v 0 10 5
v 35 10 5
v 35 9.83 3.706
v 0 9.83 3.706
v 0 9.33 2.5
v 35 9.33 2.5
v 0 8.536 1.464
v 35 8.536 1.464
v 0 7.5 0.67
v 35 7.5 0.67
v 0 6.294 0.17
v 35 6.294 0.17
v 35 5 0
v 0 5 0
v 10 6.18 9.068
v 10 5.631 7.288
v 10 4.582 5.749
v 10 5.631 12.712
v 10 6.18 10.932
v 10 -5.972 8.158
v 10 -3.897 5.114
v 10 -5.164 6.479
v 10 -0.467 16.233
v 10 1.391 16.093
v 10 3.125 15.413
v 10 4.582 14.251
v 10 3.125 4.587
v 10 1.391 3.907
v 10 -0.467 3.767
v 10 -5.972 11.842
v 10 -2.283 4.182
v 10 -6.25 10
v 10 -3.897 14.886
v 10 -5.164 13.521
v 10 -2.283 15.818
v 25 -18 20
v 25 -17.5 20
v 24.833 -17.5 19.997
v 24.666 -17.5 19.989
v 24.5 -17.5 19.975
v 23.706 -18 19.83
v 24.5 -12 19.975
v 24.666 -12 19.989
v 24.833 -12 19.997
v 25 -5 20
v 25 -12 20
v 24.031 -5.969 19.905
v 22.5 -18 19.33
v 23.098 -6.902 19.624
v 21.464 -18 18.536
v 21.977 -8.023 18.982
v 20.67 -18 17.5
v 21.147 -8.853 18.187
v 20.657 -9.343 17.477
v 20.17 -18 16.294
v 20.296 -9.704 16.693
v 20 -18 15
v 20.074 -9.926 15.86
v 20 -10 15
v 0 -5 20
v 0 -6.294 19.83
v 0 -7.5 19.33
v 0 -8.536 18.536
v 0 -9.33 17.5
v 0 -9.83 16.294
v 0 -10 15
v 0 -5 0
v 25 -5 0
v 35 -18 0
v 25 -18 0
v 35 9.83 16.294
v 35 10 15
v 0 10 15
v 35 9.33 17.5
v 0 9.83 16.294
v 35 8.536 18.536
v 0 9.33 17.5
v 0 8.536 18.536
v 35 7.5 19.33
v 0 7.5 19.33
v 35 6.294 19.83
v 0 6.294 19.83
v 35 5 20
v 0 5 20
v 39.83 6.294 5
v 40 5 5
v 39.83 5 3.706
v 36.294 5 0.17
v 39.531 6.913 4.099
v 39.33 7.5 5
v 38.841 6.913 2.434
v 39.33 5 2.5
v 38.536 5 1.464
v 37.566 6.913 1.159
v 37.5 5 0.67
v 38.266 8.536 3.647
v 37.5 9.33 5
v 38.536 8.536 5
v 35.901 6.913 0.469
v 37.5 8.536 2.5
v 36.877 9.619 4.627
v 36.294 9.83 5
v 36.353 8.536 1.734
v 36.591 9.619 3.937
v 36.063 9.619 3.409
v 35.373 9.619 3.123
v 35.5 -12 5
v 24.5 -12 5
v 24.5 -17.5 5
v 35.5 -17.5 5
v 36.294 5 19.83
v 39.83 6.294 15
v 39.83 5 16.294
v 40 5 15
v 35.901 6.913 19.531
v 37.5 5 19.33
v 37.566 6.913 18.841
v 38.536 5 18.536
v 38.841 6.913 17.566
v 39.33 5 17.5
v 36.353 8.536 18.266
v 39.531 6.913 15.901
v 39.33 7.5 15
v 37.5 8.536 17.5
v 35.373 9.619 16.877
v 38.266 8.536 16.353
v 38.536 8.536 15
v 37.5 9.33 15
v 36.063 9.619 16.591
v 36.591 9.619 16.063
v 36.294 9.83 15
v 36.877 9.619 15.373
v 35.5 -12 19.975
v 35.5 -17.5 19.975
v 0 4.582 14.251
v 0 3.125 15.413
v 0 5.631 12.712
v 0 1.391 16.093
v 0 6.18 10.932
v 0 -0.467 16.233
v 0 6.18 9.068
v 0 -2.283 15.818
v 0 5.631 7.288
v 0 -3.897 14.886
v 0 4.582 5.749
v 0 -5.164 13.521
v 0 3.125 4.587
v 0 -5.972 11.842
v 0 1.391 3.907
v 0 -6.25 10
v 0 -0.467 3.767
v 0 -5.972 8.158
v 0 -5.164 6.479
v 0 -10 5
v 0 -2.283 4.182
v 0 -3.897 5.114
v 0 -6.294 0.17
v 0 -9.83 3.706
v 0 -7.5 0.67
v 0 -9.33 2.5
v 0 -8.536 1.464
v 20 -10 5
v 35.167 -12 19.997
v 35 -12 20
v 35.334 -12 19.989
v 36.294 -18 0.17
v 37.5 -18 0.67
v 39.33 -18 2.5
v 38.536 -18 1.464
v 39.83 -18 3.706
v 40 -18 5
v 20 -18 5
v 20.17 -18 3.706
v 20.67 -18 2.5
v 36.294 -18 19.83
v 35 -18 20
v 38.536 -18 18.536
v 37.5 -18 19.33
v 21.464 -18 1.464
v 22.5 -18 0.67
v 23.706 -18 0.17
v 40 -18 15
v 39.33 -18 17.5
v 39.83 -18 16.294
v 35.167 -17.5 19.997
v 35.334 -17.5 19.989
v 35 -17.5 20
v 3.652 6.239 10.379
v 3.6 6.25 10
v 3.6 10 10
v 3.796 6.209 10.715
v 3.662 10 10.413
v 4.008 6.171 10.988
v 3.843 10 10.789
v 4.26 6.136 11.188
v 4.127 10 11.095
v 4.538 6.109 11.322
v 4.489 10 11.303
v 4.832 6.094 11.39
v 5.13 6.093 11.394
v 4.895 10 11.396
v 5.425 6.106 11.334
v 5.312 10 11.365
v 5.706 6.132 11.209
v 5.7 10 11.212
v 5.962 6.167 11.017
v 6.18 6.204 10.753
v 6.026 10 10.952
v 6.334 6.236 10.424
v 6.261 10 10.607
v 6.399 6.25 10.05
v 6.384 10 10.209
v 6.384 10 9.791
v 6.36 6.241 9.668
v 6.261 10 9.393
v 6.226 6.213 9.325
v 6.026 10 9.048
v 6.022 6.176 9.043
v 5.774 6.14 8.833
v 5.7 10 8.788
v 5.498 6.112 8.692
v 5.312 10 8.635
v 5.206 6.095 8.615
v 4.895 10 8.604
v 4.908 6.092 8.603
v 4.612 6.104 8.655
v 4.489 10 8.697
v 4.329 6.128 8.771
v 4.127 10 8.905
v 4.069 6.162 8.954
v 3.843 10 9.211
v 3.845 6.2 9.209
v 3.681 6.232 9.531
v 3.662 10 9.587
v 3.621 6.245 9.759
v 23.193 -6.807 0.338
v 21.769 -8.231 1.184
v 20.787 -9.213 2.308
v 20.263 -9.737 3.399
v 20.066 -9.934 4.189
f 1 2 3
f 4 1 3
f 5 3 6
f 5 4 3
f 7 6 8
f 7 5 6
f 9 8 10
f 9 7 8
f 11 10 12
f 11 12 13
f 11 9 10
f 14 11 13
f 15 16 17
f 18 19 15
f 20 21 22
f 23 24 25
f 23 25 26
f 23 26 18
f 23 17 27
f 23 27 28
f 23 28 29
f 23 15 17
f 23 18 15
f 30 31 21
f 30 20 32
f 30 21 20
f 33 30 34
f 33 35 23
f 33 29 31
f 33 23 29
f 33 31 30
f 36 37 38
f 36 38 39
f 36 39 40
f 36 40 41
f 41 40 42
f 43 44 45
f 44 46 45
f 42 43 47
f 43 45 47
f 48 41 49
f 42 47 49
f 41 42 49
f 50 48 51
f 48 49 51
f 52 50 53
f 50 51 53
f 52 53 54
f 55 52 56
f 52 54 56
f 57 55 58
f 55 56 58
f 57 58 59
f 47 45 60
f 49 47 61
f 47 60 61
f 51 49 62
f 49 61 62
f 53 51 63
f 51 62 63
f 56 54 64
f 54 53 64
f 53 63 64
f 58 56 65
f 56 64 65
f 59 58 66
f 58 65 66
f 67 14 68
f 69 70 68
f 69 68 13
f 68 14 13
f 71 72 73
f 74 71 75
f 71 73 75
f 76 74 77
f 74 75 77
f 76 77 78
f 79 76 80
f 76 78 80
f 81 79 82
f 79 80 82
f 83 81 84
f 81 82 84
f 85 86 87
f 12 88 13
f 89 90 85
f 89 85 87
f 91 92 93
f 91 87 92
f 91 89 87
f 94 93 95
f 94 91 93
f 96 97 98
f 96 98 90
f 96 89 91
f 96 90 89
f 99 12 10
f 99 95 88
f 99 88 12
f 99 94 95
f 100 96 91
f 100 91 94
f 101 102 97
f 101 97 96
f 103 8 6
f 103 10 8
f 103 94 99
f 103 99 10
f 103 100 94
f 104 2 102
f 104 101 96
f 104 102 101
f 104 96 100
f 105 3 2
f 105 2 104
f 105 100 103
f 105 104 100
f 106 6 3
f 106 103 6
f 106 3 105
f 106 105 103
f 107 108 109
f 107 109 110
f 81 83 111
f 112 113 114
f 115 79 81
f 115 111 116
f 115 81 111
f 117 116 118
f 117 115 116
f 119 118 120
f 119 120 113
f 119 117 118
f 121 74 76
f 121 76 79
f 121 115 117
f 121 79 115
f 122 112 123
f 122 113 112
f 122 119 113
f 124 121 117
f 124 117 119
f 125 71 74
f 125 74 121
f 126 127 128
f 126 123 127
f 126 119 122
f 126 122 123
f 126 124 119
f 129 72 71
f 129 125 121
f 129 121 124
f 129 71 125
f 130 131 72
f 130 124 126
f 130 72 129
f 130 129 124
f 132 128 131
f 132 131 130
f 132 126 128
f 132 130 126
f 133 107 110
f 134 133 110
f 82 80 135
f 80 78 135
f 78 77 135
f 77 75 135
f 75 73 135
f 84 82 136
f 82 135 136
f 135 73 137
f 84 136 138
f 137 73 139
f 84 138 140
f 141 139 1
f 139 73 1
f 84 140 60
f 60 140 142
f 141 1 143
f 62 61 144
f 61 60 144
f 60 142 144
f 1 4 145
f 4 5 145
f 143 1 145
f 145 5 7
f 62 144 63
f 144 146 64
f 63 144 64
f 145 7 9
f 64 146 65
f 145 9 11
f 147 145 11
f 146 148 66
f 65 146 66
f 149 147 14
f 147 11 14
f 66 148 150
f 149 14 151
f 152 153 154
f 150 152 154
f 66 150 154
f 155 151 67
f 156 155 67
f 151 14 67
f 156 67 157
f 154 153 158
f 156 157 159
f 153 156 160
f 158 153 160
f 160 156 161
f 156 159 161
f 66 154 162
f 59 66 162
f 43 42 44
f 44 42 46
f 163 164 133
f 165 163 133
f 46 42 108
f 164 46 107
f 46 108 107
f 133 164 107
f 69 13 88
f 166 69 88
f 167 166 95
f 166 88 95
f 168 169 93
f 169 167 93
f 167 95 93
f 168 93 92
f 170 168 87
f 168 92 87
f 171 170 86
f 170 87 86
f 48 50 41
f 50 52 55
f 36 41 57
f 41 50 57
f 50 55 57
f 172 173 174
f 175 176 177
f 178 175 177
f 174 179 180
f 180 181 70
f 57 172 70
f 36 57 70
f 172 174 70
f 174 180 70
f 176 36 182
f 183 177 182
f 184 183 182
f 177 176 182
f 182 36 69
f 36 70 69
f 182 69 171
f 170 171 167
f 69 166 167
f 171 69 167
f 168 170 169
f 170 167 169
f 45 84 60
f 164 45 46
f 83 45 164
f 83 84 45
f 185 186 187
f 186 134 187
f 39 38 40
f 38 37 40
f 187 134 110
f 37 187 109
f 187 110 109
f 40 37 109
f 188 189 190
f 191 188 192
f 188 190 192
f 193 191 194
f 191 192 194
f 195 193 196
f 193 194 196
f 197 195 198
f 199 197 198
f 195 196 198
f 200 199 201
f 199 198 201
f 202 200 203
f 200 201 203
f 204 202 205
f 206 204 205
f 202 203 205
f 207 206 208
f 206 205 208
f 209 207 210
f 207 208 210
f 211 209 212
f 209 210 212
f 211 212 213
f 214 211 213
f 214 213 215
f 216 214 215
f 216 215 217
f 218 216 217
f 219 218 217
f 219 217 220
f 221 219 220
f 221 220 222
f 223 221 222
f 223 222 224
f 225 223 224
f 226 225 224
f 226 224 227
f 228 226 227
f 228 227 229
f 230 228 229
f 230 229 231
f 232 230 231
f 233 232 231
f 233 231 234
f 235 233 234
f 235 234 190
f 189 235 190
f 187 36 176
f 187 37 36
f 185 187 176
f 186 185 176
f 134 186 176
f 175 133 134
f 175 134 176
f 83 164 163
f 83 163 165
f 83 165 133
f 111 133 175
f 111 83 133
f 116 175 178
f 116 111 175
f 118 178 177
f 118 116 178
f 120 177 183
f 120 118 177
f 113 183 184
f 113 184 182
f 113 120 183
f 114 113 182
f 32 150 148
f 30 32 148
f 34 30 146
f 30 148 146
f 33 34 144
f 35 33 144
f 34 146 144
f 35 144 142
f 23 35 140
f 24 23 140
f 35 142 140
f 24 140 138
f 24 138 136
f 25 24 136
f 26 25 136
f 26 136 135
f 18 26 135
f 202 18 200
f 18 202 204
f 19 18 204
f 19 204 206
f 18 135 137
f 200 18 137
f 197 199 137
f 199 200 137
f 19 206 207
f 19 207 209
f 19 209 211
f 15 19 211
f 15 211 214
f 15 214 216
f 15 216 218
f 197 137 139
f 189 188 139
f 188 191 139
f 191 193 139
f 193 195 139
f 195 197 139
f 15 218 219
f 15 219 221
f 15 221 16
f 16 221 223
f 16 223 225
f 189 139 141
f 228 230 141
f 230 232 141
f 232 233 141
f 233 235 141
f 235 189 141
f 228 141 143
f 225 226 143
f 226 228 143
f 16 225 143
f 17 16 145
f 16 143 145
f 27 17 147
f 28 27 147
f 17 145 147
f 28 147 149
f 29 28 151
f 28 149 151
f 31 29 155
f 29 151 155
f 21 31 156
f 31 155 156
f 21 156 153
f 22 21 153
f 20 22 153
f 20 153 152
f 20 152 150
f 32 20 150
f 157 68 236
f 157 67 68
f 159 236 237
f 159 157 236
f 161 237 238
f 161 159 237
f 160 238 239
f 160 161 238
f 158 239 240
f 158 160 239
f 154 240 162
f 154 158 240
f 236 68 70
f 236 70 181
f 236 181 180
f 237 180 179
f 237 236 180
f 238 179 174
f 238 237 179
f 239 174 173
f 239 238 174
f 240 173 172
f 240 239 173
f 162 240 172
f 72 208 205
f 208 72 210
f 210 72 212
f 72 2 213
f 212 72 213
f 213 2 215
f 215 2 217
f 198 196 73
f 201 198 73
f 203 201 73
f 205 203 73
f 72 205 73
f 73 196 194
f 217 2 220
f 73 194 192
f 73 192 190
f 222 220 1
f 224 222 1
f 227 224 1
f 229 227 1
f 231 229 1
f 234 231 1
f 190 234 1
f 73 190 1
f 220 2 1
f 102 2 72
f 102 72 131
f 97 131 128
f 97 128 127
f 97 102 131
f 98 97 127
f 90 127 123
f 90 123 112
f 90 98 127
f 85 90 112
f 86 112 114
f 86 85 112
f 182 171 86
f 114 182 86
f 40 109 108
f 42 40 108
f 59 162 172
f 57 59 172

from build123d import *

# Parameters (mm, degrees)
F1_DEPTH     = 20
F2_DEPTH     = 5
F3_R         = 6.25
F4_DEPTH     = 10
F5_R         = 1.4
F6_DEPTH     = 3.9098179487
F7_T1_DEPTH  = 47.5
F7_T3_DEPTH  = 32.5
F7_T5_DEPTH  = 20.5
F7_T7_DEPTH  = 35.5
F7_T9_DEPTH  = 10
F7_S13_W     = 5
F7_S13_H     = 5
F7_T14_DEPTH = 5
F7_S19_W     = 5
F7_S19_H     = 5
F7_T20_DEPTH = 5
F7_T27_DEPTH = 45
F7_T31_DEPTH = 33
F7_T38_DEPTH = 45
F7_T42_DEPTH = 33


# Not quite as in the source:
# - a fillet or chamfer that OpenCascade refuses, or shapes differently, is made with other operations: its cross-section is extruded or revolved along the edge and cut away or added


with BuildPart() as f1:
    # F0 (on Top) → F1 (new body)
    with BuildSketch(Plane.XY):
        Polygon((0, 10), (0, 0), (0, -10), (20, -10), (20, -18), (40, -18), (40, 10), align=None)
        Polygon((35.5, -12), (35.5, -17.5), (30, -17.5), (24.5, -17.5), (24.5, -12), align=None, mode=Mode.SUBTRACT)
    extrude(amount=F1_DEPTH)

    # F0 (on Top) → F2 (join)
    with BuildSketch(Plane.XY):
        Polygon((30, -17.5), (35.5, -17.5), (35.5, -12), (24.5, -12), (24.5, -17.5), align=None)
    extrude(amount=F2_DEPTH)

    # F3 (on face) → F4 (cut)
    with BuildSketch(Plane(origin=(0, 0, 0), x_dir=(0, -1, 0), z_dir=(-1, 0, 0))):
        with Locations((0, 10)):
            Circle(F3_R)
    extrude(amount=-F4_DEPTH, mode=Mode.SUBTRACT)

    # F5 (on face) → F6 (cut, through all)
    with BuildSketch(Plane(origin=(0, 10, 0), x_dir=(-1, 0, 0), z_dir=(0, 1, 0))):
        with Locations((-5, 10)):
            Circle(F5_R)
    extrude(amount=-F6_DEPTH, mode=Mode.SUBTRACT)

    # F7: fillet of radius 5 on 9 edges, made by hand

    # F7_s2 → F7_t1 (cut)
    with BuildSketch(Plane.YZ.offset(-12.5)):
        with BuildLine():
            ThreePointArc((10, 15), (8.5355339059, 18.5355339059), (5, 20))
            Line((5, 20), (10, 20))
            Line((10, 20), (10, 15))
        make_face()
        with BuildLine():
            ThreePointArc((10, 5), (8.5355339059, 1.4644660941), (5, 0))
            Line((5, 0), (10, 0))
            Line((10, 0), (10, 5))
        make_face()
    extrude(amount=F7_T1_DEPTH, mode=Mode.SUBTRACT)

    # F7_s4 → F7_t3 (cut)
    with BuildSketch(Plane.YZ.offset(-12.5)):
        with BuildLine():
            ThreePointArc((-5, 20), (-8.5355339059, 18.5355339059), (-10, 15))
            Line((-10, 15), (-10, 20))
            Line((-10, 20), (-5, 20))
        make_face()
        with BuildLine():
            ThreePointArc((-5, 0), (-8.5355339059, 1.4644660941), (-10, 5))
            Line((-10, 5), (-10, 0))
            Line((-10, 0), (-5, 0))
        make_face()
    extrude(amount=F7_T3_DEPTH, mode=Mode.SUBTRACT)

    # F7_s6 → F7_t5 (cut)
    with BuildSketch(Plane.XZ.offset(10)):
        with BuildLine():
            ThreePointArc((25, 20), (21.4644660941, 18.5355339059), (20, 15))
            Line((20, 15), (20, 20))
            Line((20, 20), (25, 20))
        make_face()
        with BuildLine():
            ThreePointArc((25, 0), (21.4644660941, 1.4644660941), (20, 5))
            Line((20, 5), (20, 0))
            Line((20, 0), (25, 0))
        make_face()
    extrude(amount=F7_T5_DEPTH, mode=Mode.SUBTRACT)

    # F7_s8 → F7_t7 (cut)
    with BuildSketch(Plane.XZ.offset(-5)):
        with BuildLine():
            ThreePointArc((35, 20), (38.5355339059, 18.5355339059), (40, 15))
            Line((40, 15), (40, 20))
            Line((40, 20), (35, 20))
        make_face()
        with BuildLine():
            ThreePointArc((35, 0), (38.5355339059, 1.4644660941), (40, 5))
            Line((40, 5), (40, 0))
            Line((40, 0), (35, 0))
        make_face()
    extrude(amount=F7_T7_DEPTH, mode=Mode.SUBTRACT)

    # F7_s10 → F7_t9 (cut)
    with BuildSketch(Plane.XY.offset(5)):
        with BuildLine():
            ThreePointArc((35, 10), (38.5355339059, 8.5355339059), (40, 5))
            Line((40, 5), (40, 10))
            Line((40, 10), (35, 10))
        make_face()
    extrude(amount=F7_T9_DEPTH, mode=Mode.SUBTRACT)


with BuildPart() as f7_tool12:
    # F7_s13 → F7_t14 (new body)
    with BuildSketch(Plane.XZ.offset(-5)):
        with Locations((37.5, 17.5)):
            Rectangle(F7_S13_W, F7_S13_H)
    extrude(amount=-F7_T14_DEPTH)

    # F7_s15 → F7_t16 (revolve, cut)
    with BuildSketch(Plane(origin=(35, 5, 15), x_dir=(-0.7071067812, 0, -0.7071067812), z_dir=(0.7071067812, 0, -0.7071067812))):
        with BuildLine():
            ThreePointArc((0, -5), (5, 0), (0, 5))
            Line((0, 5), (0, -5))
        make_face()
    revolve(axis=Axis((35, 5, 15), (0, 1, 0)), mode=Mode.SUBTRACT)


with BuildPart() as f1_1:
    add(f1.part)

    # F7_t11: cut F7_tool12
    add(f7_tool12.part, mode=Mode.SUBTRACT)


with BuildPart() as f7_tool18:
    # F7_s19 → F7_t20 (new body)
    with BuildSketch(Plane.XZ.offset(-5)):
        with Locations((37.5, 2.5)):
            Rectangle(F7_S19_W, F7_S19_H)
    extrude(amount=-F7_T20_DEPTH)

    # F7_s21 → F7_t22 (revolve, cut)
    with BuildSketch(Plane(origin=(35, 5, 5), x_dir=(-0.7071067812, 0, 0.7071067812), z_dir=(-0.7071067812, 0, -0.7071067812))):
        with BuildLine():
            ThreePointArc((0, -5), (5, 0), (0, 5))
            Line((0, 5), (0, -5))
        make_face()
    revolve(axis=Axis((35, 5, 5), (0, 1, 0)), mode=Mode.SUBTRACT)


with BuildPart() as f1_2:
    add(f1_1.part)

    # F7_t17: cut F7_tool18
    add(f7_tool18.part, mode=Mode.SUBTRACT)


with BuildPart() as f7_tool25:
    # F7_s26 → F7_t27 (new body)
    with BuildSketch(Plane.YZ.offset(-12.5)):
        with BuildLine():
            ThreePointArc((-5, 20), (-8.5355339059, 18.5355339059), (-10, 15))
            Line((-10, 15), (-10, 20))
            Line((-10, 20), (-5, 20))
        make_face()
    extrude(amount=F7_T27_DEPTH)

    split(bisect_by=Plane.YZ.offset(20), keep=Keep.TOP)


with BuildPart() as f7_tool29:
    # F7_s30 → F7_t31 (new body)
    with BuildSketch(Plane.XZ.offset(-2.5)):
        with BuildLine():
            ThreePointArc((25, 20), (21.4644660941, 18.5355339059), (20, 15))
            Line((20, 15), (20, 20))
            Line((20, 20), (25, 20))
        make_face()
    extrude(amount=F7_T31_DEPTH)

    split(bisect_by=Plane.XZ.offset(10), keep=Keep.BOTTOM)


with BuildPart() as f7_tool25_1:
    add(f7_tool25.part)

    # F7_t33: intersect F7_tool29
    add(f7_tool29.part, mode=Mode.INTERSECT)


with BuildPart() as f1_3:
    add(f1_2.part)

    # F7_t23: cut F7_tool25
    add(f7_tool25_1.part, mode=Mode.SUBTRACT)


with BuildPart() as f7_tool36:
    # F7_s37 → F7_t38 (new body)
    with BuildSketch(Plane.YZ.offset(-12.5)):
        with BuildLine():
            ThreePointArc((-5, 0), (-8.5355339059, 1.4644660941), (-10, 5))
            Line((-10, 5), (-10, 0))
            Line((-10, 0), (-5, 0))
        make_face()
    extrude(amount=F7_T38_DEPTH)

    split(bisect_by=Plane.YZ.offset(20), keep=Keep.TOP)


with BuildPart() as f7_tool40:
    # F7_s41 → F7_t42 (new body)
    with BuildSketch(Plane.XZ.offset(-2.5)):
        with BuildLine():
            ThreePointArc((25, 0), (21.4644660941, 1.4644660941), (20, 5))
            Line((20, 5), (20, 0))
            Line((20, 0), (25, 0))
        make_face()
    extrude(amount=F7_T42_DEPTH)

    split(bisect_by=Plane.XZ.offset(10), keep=Keep.BOTTOM)


with BuildPart() as f7_tool36_1:
    add(f7_tool36.part)

    # F7_t44: intersect F7_tool40
    add(f7_tool40.part, mode=Mode.INTERSECT)


with BuildPart() as f1_4:
    add(f1_3.part)

    # F7_t34: cut F7_tool36
    add(f7_tool36_1.part, mode=Mode.SUBTRACT)


solid = f1_4.part
